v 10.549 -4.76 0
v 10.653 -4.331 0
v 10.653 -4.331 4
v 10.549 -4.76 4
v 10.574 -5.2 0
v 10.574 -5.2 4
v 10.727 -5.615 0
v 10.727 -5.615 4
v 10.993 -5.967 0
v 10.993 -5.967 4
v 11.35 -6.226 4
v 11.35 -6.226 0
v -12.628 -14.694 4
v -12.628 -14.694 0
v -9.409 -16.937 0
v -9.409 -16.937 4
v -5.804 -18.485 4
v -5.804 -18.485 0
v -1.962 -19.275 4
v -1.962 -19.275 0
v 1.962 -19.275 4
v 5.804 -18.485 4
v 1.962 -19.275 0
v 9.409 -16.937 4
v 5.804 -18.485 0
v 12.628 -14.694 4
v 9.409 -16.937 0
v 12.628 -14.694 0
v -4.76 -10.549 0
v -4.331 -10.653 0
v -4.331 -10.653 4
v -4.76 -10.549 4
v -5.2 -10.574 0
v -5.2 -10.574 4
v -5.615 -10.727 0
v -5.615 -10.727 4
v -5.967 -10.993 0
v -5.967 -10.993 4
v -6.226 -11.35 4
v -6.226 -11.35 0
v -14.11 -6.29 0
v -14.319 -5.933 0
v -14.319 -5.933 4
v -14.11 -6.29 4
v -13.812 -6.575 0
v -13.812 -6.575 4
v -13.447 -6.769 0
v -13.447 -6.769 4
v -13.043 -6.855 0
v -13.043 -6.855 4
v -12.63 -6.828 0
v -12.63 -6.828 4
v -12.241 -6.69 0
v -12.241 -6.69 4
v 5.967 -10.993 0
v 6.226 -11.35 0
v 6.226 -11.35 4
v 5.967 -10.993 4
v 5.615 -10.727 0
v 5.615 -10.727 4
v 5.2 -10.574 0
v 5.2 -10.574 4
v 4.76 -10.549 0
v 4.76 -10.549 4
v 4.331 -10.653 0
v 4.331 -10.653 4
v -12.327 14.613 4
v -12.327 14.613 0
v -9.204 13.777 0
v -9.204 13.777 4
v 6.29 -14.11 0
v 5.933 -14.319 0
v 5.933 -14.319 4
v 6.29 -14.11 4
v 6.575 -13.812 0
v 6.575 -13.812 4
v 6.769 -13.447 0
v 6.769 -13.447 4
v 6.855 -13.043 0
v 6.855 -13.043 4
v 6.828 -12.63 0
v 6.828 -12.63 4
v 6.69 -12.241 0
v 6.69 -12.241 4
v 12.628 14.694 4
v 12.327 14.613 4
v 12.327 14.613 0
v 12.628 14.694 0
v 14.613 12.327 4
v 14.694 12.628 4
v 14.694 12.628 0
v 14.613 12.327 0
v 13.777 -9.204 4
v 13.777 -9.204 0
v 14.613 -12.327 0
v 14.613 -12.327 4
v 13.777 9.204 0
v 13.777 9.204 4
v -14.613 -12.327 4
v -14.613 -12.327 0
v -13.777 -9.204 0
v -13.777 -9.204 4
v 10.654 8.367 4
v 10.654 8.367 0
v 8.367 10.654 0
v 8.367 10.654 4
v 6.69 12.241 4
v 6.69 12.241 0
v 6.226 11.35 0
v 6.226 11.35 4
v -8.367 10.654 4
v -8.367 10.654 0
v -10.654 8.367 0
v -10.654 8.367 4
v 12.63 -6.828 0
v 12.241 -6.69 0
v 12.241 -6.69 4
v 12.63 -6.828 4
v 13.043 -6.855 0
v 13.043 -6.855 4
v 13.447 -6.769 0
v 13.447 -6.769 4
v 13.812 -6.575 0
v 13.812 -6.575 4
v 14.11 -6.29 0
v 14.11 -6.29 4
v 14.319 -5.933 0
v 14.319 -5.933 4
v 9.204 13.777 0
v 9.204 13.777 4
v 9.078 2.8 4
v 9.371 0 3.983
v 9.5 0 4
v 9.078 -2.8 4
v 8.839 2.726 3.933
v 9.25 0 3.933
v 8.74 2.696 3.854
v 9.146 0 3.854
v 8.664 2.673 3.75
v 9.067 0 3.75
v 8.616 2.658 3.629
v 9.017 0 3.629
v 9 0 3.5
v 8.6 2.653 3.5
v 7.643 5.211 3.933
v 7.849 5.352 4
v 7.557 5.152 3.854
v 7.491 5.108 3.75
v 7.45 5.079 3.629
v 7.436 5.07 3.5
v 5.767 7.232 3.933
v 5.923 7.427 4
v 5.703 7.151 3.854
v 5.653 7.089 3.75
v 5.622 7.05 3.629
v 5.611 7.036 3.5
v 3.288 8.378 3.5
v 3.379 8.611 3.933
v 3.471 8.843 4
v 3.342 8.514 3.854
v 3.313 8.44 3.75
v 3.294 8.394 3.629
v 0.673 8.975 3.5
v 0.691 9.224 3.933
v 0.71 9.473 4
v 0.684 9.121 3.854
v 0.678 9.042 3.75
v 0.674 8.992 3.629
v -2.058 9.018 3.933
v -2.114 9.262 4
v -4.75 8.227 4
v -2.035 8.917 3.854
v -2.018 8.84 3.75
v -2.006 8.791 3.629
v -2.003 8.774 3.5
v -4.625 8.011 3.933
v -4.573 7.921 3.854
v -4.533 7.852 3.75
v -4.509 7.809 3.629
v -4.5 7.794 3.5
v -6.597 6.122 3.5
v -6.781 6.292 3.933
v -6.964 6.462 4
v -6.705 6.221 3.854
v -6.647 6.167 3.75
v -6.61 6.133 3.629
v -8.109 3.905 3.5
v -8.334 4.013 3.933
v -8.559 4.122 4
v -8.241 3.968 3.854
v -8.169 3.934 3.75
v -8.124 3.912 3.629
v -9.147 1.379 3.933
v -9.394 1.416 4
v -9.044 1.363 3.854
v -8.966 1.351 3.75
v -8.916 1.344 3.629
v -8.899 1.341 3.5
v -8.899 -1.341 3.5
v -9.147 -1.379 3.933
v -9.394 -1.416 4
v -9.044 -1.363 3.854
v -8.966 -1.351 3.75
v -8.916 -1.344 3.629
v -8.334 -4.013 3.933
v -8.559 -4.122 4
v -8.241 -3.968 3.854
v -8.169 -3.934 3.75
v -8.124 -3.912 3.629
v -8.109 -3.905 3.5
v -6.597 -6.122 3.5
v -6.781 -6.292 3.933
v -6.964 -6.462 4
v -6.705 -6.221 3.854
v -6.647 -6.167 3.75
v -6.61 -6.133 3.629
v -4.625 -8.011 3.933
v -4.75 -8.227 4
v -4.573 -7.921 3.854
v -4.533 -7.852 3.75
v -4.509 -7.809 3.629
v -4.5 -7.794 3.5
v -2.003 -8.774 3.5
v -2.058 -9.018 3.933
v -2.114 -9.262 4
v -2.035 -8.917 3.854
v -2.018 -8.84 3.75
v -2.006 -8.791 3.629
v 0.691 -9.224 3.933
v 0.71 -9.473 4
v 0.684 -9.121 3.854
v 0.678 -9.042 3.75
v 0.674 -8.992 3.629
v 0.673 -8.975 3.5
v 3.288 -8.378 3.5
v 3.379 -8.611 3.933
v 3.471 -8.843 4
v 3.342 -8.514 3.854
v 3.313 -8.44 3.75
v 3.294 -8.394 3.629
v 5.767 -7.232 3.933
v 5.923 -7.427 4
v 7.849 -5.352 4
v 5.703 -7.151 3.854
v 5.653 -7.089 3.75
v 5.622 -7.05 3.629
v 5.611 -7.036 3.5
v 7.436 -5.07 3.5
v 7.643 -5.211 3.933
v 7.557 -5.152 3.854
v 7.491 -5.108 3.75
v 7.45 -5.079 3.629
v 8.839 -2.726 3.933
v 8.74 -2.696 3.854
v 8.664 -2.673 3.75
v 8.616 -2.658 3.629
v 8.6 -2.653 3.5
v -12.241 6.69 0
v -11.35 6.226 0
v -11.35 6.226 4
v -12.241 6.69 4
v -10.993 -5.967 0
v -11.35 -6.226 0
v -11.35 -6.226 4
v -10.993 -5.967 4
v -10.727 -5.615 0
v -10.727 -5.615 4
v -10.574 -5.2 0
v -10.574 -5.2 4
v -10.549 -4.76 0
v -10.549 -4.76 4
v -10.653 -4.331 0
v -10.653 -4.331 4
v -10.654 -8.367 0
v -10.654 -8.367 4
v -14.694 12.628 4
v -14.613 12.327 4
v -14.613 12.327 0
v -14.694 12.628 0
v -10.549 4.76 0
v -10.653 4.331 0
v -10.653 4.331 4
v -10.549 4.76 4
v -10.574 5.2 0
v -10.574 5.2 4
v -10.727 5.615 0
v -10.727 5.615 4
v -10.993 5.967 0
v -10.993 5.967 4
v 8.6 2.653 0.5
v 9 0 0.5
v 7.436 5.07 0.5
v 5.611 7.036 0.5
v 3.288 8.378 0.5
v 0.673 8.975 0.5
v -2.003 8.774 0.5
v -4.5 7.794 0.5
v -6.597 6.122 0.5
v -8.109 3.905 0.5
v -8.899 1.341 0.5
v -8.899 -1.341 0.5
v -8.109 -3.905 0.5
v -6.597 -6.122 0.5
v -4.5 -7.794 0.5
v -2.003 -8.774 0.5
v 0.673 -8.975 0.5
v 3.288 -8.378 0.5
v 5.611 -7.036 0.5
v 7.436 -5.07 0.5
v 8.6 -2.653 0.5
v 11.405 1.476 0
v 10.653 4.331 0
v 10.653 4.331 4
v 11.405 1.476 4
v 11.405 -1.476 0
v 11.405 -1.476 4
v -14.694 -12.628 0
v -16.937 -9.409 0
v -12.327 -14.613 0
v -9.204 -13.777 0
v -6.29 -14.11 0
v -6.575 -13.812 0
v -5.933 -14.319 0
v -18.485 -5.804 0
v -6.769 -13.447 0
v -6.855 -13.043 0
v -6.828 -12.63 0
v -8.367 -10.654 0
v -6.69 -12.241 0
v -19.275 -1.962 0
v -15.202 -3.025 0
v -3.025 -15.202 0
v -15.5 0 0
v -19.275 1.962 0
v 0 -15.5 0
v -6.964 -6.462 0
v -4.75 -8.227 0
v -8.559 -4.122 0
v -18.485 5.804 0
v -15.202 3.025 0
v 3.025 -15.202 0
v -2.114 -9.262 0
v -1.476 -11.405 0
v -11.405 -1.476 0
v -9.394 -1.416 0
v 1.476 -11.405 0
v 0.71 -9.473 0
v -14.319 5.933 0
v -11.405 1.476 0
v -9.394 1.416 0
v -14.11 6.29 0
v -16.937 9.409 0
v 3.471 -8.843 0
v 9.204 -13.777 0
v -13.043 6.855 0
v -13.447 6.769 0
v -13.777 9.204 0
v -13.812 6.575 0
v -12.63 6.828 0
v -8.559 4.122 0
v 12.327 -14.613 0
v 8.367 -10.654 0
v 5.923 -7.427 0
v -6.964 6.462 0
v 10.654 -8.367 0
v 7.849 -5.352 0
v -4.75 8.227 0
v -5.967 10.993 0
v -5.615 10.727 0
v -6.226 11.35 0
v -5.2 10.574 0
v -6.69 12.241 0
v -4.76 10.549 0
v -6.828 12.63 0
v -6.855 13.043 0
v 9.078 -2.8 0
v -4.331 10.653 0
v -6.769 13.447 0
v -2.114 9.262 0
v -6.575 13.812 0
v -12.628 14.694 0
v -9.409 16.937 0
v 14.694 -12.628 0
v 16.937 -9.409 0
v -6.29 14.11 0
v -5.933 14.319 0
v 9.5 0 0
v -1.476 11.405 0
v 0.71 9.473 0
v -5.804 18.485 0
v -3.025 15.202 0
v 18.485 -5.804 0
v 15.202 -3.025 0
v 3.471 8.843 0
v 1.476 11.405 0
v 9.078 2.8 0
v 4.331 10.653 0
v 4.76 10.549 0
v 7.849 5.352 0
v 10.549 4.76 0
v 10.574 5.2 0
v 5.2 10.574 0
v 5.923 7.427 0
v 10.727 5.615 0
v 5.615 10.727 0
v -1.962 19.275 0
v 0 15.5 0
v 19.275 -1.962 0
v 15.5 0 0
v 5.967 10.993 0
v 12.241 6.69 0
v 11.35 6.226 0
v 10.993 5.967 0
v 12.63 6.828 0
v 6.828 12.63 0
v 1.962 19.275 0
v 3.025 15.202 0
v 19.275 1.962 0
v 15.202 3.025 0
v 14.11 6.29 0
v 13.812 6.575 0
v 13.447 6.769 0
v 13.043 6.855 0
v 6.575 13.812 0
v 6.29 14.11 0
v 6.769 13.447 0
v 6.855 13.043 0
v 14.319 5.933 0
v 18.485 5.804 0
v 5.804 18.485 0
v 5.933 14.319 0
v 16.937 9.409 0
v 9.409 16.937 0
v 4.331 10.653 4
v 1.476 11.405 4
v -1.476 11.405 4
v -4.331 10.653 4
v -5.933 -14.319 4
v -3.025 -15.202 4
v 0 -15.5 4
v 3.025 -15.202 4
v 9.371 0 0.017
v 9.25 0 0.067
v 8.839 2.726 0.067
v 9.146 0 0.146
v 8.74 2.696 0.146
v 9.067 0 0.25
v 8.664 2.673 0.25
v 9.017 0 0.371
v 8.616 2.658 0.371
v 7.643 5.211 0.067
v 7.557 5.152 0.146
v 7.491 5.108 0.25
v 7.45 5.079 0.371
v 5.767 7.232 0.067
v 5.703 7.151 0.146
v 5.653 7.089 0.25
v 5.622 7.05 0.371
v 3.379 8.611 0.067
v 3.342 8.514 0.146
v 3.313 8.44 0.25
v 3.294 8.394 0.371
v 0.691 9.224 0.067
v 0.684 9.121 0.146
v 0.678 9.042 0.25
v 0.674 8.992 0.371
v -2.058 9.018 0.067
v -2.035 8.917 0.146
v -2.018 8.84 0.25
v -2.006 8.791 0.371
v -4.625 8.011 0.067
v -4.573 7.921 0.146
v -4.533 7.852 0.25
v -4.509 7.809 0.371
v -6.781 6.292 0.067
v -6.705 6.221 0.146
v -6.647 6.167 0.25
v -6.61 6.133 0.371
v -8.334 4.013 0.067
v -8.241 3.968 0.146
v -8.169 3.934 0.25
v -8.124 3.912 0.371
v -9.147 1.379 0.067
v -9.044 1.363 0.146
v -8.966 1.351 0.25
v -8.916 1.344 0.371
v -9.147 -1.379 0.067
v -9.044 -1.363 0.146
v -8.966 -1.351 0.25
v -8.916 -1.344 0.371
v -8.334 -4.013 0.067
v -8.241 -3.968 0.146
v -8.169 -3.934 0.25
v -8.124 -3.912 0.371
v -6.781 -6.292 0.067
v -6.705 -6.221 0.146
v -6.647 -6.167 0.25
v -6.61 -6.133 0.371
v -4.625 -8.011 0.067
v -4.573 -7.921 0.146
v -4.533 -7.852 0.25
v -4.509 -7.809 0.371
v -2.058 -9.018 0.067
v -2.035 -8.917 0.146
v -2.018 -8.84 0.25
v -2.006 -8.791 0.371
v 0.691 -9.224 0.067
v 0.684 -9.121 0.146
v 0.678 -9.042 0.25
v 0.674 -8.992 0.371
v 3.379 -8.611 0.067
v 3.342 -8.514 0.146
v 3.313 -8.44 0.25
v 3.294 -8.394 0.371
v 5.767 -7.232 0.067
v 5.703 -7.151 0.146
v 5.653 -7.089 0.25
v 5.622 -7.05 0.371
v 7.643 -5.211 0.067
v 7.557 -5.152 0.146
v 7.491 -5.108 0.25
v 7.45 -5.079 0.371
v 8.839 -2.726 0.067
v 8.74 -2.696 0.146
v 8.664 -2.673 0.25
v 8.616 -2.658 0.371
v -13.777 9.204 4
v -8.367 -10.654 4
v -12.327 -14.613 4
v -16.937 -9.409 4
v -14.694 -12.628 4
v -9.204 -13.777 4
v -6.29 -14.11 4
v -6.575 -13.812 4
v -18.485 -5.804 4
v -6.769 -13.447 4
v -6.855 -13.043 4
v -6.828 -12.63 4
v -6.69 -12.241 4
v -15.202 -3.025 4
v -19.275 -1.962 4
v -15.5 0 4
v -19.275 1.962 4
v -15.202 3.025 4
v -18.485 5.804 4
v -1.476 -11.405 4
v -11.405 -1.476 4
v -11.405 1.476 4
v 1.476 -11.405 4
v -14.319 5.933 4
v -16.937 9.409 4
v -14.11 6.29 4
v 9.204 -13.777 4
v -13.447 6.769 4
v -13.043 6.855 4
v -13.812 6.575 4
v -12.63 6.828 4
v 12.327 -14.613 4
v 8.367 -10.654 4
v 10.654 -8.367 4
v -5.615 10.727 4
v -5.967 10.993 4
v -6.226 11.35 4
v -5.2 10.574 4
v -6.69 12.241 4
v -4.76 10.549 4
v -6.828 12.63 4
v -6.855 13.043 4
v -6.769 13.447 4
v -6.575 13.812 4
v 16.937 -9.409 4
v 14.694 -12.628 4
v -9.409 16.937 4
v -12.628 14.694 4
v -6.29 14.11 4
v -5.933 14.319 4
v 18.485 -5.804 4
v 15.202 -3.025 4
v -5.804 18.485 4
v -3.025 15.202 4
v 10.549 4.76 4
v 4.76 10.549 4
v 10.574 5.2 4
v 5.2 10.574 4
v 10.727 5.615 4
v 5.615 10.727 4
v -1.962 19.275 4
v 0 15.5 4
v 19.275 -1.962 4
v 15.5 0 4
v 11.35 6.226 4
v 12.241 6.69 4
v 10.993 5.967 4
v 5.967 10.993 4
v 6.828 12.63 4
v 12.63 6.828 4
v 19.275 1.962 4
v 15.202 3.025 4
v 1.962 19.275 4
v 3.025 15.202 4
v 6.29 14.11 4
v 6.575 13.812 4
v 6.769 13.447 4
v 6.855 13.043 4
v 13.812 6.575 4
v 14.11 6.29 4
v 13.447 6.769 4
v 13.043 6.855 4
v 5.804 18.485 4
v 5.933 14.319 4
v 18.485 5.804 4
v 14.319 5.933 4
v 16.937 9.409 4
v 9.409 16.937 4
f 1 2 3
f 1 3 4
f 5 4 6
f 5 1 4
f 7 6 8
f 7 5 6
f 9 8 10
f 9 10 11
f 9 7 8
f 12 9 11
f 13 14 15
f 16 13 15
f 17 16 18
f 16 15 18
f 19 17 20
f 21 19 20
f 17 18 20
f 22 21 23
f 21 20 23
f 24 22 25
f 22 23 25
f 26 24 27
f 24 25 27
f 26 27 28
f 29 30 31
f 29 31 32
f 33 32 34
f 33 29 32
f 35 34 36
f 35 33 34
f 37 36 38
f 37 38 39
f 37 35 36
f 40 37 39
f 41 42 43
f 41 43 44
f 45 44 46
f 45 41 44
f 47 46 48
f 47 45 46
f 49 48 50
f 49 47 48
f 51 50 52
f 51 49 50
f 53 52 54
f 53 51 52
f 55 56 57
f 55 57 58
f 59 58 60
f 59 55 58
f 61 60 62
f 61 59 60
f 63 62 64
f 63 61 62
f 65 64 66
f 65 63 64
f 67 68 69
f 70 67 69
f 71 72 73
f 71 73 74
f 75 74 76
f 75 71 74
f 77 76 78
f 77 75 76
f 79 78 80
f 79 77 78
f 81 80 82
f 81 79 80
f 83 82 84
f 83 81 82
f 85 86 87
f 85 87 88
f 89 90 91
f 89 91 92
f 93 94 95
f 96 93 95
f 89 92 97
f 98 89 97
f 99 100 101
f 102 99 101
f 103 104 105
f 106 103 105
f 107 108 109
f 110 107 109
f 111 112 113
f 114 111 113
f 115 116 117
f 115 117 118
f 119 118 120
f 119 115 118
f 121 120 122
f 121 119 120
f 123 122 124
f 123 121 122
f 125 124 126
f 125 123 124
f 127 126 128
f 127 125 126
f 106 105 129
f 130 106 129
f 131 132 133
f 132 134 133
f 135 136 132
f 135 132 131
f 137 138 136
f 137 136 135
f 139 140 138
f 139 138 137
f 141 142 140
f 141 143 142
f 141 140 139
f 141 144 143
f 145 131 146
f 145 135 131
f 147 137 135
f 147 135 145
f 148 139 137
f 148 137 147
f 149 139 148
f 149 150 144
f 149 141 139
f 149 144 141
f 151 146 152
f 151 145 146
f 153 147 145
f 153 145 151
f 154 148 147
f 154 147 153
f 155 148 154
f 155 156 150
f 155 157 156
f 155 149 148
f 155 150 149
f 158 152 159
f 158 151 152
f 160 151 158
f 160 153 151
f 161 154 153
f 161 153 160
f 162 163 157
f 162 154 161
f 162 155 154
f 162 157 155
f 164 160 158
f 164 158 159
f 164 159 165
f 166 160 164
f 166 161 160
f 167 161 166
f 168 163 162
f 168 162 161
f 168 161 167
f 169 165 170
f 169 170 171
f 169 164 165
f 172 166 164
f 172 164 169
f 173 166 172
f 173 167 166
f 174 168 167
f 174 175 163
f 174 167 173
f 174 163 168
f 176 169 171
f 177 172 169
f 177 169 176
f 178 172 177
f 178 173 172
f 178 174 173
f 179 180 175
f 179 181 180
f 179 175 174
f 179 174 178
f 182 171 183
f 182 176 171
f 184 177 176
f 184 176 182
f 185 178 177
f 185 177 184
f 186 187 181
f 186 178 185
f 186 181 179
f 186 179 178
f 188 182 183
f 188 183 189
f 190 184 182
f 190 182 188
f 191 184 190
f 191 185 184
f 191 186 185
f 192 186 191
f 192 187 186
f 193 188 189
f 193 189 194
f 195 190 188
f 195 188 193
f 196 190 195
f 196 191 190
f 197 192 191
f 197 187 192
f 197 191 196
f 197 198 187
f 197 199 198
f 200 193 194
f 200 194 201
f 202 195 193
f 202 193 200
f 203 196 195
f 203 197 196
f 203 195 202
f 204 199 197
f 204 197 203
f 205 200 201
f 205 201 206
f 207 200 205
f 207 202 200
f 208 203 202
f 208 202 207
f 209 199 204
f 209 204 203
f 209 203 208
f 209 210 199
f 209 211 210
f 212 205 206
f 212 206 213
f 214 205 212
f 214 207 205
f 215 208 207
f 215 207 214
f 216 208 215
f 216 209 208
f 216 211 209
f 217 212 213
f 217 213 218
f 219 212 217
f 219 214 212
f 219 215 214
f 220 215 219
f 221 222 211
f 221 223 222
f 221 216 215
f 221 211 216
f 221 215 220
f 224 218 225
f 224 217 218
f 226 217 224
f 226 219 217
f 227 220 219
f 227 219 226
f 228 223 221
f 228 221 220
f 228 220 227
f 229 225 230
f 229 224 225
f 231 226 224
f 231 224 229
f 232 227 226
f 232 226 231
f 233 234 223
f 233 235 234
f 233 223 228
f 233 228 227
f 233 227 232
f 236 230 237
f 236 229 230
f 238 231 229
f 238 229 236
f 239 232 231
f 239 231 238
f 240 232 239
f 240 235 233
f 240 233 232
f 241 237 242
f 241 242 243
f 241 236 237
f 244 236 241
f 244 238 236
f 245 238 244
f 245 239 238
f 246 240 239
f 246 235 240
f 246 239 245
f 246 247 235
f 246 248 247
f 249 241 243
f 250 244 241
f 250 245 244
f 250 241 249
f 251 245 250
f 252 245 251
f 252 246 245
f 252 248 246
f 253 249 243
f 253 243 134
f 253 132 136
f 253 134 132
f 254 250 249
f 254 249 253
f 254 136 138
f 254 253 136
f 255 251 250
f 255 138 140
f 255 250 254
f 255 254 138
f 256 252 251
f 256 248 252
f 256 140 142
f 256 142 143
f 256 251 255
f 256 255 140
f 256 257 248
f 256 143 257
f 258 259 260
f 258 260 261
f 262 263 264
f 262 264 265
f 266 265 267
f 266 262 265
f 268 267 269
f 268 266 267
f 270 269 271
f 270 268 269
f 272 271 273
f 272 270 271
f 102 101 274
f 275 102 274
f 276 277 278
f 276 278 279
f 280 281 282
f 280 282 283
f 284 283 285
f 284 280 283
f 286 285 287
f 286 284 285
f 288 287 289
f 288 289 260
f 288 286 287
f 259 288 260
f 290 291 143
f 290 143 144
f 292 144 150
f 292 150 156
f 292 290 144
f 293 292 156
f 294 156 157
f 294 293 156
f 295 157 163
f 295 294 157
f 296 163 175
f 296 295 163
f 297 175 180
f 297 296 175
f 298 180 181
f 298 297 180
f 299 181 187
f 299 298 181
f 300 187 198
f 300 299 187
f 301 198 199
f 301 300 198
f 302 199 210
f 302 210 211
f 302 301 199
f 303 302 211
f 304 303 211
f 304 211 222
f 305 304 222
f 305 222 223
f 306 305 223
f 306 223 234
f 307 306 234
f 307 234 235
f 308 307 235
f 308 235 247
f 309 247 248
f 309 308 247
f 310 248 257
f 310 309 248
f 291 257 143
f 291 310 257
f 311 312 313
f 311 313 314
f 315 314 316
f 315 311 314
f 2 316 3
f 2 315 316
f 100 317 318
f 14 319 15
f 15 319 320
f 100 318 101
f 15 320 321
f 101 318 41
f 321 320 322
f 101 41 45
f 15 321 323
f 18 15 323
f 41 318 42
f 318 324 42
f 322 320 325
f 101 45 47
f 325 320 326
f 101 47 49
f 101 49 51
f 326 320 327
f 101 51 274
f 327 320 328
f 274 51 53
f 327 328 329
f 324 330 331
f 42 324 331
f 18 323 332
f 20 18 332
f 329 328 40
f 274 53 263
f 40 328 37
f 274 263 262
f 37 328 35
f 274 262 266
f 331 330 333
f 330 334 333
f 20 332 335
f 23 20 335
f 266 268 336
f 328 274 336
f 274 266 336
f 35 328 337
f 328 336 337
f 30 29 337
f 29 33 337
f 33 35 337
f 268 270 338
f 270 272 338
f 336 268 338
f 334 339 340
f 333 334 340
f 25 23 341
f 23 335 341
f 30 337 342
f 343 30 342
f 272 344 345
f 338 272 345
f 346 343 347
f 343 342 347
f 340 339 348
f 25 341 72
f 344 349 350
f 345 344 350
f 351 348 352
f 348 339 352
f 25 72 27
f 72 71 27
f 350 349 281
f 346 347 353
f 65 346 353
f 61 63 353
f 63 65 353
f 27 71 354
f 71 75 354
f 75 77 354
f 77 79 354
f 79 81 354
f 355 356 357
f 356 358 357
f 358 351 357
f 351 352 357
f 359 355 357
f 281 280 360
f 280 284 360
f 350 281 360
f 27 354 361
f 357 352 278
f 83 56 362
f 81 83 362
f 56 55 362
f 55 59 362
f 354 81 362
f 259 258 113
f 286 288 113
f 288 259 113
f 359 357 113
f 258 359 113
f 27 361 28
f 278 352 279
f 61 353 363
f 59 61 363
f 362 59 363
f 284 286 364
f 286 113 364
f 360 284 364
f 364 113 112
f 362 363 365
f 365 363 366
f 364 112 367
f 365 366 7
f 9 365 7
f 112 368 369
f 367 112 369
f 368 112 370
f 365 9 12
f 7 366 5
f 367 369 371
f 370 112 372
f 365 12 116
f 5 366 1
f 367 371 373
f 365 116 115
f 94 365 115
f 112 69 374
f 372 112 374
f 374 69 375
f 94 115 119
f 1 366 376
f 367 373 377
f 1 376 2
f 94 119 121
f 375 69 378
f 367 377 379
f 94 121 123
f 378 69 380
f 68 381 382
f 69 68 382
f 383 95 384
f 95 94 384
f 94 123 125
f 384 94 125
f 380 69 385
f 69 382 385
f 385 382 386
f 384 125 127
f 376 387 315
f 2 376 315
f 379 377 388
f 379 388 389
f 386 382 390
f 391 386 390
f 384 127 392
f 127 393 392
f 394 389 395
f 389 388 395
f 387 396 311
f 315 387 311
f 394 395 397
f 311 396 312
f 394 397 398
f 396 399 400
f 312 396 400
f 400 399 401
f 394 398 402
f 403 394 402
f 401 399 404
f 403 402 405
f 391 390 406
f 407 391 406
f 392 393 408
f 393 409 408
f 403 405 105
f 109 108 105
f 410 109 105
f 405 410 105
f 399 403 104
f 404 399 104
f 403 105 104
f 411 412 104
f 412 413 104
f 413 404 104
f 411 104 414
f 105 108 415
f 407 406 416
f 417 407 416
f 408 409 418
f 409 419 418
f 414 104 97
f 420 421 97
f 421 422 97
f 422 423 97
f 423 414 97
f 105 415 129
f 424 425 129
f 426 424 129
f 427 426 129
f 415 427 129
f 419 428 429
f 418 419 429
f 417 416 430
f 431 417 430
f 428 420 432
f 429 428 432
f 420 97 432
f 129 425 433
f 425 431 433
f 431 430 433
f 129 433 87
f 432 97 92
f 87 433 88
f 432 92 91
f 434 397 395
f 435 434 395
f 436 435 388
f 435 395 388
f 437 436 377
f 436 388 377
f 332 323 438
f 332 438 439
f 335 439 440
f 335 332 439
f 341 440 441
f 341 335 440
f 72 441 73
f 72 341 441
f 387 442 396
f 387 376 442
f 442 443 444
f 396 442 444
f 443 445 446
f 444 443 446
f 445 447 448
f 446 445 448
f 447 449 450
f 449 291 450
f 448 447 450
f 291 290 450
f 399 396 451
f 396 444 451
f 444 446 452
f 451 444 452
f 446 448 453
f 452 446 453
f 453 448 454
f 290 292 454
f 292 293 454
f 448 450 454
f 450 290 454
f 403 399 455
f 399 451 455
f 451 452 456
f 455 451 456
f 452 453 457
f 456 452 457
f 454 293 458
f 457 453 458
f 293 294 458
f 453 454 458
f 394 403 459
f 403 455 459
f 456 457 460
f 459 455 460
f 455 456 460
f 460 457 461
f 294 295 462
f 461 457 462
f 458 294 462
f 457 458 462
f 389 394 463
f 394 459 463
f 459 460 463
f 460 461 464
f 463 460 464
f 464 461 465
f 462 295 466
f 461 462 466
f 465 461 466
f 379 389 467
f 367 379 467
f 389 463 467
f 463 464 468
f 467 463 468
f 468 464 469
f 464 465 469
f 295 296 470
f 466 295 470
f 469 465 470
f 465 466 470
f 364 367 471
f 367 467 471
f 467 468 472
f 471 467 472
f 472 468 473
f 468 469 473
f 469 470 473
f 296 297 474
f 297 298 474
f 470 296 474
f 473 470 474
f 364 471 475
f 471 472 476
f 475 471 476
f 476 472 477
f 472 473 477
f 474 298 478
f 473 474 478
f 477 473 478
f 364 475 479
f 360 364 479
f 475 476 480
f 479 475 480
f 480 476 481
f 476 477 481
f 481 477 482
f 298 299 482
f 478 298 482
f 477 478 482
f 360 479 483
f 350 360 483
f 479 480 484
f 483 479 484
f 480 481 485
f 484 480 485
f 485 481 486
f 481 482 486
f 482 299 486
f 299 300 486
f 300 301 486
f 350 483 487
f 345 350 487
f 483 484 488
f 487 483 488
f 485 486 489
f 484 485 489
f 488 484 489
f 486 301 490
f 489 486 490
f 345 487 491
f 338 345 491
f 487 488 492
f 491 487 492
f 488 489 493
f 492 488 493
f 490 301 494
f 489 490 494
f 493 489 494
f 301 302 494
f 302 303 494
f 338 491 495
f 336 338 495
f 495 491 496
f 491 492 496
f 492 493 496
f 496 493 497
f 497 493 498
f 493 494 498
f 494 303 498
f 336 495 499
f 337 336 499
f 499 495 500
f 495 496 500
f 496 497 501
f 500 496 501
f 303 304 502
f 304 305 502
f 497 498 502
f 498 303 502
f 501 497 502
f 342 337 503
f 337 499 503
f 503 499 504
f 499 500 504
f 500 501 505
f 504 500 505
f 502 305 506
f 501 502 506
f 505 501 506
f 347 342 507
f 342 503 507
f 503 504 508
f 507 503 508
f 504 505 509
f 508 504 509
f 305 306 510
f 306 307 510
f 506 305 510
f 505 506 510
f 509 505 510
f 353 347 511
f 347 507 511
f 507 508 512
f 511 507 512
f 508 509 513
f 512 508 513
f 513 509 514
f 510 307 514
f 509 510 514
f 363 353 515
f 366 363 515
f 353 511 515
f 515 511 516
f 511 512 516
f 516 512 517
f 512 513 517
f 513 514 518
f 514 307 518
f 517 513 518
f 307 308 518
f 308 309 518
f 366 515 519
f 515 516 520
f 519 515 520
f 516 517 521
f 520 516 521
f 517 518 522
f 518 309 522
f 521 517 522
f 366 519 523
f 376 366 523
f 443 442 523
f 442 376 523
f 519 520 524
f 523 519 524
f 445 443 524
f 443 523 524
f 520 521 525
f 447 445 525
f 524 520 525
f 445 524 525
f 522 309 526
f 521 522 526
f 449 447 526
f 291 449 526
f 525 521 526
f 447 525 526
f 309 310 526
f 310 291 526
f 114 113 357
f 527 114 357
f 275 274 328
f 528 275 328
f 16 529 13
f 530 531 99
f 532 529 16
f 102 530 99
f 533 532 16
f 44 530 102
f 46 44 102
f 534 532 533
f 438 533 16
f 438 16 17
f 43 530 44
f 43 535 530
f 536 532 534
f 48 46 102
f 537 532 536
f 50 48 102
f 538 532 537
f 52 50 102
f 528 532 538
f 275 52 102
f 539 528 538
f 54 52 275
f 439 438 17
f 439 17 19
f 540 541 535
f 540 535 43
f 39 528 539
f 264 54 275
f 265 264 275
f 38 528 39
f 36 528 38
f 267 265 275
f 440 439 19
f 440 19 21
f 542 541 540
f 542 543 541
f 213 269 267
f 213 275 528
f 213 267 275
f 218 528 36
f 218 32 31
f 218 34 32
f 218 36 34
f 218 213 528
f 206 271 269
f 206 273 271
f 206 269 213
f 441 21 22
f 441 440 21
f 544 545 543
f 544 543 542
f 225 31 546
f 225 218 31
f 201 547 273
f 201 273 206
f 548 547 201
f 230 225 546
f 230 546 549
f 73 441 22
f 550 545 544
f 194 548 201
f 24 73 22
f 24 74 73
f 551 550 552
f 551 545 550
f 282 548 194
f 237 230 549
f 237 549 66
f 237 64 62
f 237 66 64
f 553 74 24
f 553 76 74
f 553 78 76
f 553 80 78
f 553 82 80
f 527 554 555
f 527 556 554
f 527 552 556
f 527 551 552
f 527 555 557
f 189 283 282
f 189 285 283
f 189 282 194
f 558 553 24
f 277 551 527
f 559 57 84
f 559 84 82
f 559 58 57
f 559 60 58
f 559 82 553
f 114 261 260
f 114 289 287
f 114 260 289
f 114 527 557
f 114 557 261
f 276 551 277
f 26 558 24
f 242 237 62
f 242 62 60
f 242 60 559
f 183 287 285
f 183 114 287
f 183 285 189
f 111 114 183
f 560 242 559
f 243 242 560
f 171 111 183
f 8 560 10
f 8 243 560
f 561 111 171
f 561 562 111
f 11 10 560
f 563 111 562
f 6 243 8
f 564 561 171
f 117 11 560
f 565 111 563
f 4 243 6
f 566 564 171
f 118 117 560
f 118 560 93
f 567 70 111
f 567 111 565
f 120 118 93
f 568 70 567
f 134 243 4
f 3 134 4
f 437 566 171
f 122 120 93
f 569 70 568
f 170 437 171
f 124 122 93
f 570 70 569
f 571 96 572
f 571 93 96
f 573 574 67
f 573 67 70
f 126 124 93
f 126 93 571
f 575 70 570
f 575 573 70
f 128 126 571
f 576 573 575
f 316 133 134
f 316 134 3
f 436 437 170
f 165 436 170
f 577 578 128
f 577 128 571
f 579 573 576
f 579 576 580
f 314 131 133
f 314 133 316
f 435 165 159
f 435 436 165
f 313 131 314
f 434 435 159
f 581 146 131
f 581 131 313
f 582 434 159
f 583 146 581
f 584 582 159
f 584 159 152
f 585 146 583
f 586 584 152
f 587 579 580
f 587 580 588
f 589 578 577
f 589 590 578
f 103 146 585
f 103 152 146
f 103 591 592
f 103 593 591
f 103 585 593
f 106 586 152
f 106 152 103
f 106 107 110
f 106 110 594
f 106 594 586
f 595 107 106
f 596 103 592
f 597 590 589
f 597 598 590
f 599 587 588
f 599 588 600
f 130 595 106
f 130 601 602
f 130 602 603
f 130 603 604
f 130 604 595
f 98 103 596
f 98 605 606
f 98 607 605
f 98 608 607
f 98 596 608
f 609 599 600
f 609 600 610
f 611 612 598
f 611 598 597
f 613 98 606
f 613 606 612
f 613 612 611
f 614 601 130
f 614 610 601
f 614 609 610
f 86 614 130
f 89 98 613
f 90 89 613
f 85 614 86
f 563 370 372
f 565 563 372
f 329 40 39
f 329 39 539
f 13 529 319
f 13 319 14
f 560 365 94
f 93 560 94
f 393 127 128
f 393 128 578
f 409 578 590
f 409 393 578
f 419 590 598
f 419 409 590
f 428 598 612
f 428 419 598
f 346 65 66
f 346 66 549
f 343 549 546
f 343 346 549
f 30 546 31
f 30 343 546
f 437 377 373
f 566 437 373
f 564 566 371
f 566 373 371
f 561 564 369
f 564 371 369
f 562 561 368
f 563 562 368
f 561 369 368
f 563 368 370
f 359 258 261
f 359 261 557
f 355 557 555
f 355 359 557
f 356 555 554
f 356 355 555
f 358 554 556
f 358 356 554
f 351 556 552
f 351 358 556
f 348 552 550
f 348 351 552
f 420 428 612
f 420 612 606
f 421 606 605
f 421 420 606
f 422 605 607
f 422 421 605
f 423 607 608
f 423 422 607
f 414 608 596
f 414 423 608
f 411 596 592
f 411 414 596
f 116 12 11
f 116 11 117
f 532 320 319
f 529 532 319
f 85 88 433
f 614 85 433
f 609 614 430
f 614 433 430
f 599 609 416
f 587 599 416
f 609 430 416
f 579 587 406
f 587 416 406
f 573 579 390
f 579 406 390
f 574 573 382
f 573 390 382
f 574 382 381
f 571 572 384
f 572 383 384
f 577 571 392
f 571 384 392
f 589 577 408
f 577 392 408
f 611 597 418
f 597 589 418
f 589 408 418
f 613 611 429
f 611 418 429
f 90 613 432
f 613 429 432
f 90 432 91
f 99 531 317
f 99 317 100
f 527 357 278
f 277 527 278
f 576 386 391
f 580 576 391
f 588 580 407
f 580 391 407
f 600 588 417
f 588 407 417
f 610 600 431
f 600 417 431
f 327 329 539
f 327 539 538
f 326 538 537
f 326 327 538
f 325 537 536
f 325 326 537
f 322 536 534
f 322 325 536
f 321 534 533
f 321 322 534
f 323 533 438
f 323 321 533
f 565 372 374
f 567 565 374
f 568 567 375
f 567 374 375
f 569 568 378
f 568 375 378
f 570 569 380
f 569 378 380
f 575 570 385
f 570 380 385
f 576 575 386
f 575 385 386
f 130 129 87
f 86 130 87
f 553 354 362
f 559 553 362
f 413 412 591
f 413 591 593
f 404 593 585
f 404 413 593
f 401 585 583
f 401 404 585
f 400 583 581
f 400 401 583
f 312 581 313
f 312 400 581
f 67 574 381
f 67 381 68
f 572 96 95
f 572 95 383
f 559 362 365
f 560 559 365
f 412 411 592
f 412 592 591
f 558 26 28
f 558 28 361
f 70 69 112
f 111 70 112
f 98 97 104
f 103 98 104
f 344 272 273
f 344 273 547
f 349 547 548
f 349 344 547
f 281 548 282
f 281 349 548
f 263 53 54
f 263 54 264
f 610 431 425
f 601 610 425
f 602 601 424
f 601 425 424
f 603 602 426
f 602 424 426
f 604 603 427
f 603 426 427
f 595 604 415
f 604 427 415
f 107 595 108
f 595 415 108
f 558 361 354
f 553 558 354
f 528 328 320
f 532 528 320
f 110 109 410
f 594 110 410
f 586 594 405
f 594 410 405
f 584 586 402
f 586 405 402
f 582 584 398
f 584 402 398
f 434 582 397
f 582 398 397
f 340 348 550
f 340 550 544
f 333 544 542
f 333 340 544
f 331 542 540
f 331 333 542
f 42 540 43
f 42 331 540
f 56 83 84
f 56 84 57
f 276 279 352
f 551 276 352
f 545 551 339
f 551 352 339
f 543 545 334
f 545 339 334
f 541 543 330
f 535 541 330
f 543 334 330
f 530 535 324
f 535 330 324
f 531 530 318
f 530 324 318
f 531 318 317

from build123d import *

# Parameters (mm, degrees)
SKETCH1_R           = 19.375
SKETCH1_R_2         = 9
BOSS_EXTRUDE1_DEPTH = 4
CUT_EXTRUDE1_DEPTH  = 4
FILLET1_R           = 0.5
CUT_EXTRUDE2_DEPTH  = 10


with BuildPart() as part:
    # Sketch1 → Boss-Extrude1 (new body)
    with BuildSketch(Plane.XY):
        Circle(SKETCH1_R)
        Circle(SKETCH1_R_2, mode=Mode.SUBTRACT)
        with BuildLine():
            Line((6.689691504, 12.241024694), (6.226047976, 11.350373764))
            ThreePointArc((6.226047976, 11.350373764), (5.41320923, 10.635157913), (4.330662681, 10.653420143))
            ThreePointArc((4.330662681, 10.653420143), (0, 11.5), (-4.330662681, 10.653420143))
            ThreePointArc((-4.330662681, 10.653420143), (-5.41320923, 10.635157913), (-6.226047976, 11.350373764))
            Line((-6.226047976, 11.350373764), (-6.689691504, 12.241024694))
            ThreePointArc((-6.689691504, 12.241024694), (-6.768746058, 13.446590252), (-5.933372603, 14.319395572))
            ThreePointArc((-5.933372603, 14.319395572), (0, 15.5), (5.933372603, 14.319395572))
            ThreePointArc((5.933372603, 14.319395572), (6.768746058, 13.446590252), (6.689691504, 12.241024694))
        make_face(mode=Mode.SUBTRACT)
        with BuildLine():
            Line((12.241024694, 6.689691504), (11.350373764, 6.226047976))
            ThreePointArc((11.350373764, 6.226047976), (10.635157913, 5.41320923), (10.653420143, 4.330662681))
            ThreePointArc((10.653420143, 4.330662681), (11.5, 0), (10.653420143, -4.330662681))
            ThreePointArc((10.653420143, -4.330662681), (10.635157913, -5.41320923), (11.350373764, -6.226047976))
            Line((11.350373764, -6.226047976), (12.241024694, -6.689691504))
            ThreePointArc((12.241024694, -6.689691504), (13.446590252, -6.768746058), (14.319395572, -5.933372603))
            ThreePointArc((14.319395572, -5.933372603), (15.5, 0), (14.319395572, 5.933372603))
            ThreePointArc((14.319395572, 5.933372603), (13.446590252, 6.768746058), (12.241024694, 6.689691504))
        make_face(mode=Mode.SUBTRACT)
        with BuildLine():
            Line((6.689691504, -12.241024694), (6.226047976, -11.350373764))
            ThreePointArc((6.226047976, -11.350373764), (5.41320923, -10.635157913), (4.330662681, -10.653420143))
            ThreePointArc((4.330662681, -10.653420143), (0, -11.5), (-4.330662681, -10.653420143))
            ThreePointArc((-4.330662681, -10.653420143), (-5.41320923, -10.635157913), (-6.226047976, -11.350373764))
            Line((-6.226047976, -11.350373764), (-6.689691504, -12.241024694))
            ThreePointArc((-6.689691504, -12.241024694), (-6.768746058, -13.446590252), (-5.933372603, -14.319395572))
            ThreePointArc((-5.933372603, -14.319395572), (0, -15.5), (5.933372603, -14.319395572))
            ThreePointArc((5.933372603, -14.319395572), (6.768746058, -13.446590252), (6.689691504, -12.241024694))
        make_face(mode=Mode.SUBTRACT)
        with BuildLine():
            Line((-12.241024694, -6.689691504), (-11.350373764, -6.226047976))
            ThreePointArc((-11.350373764, -6.226047976), (-10.635157913, -5.41320923), (-10.653420143, -4.330662681))
            ThreePointArc((-10.653420143, -4.330662681), (-11.5, 0), (-10.653420143, 4.330662681))
            ThreePointArc((-10.653420143, 4.330662681), (-10.635157913, 5.41320923), (-11.350373764, 6.226047976))
            Line((-11.350373764, 6.226047976), (-12.241024694, 6.689691504))
            ThreePointArc((-12.241024694, 6.689691504), (-13.446590252, 6.768746058), (-14.319395572, 5.933372603))
            ThreePointArc((-14.319395572, 5.933372603), (-15.5, 0), (-14.319395572, -5.933372603))
            ThreePointArc((-14.319395572, -5.933372603), (-13.446590252, -6.768746058), (-12.241024694, -6.689691504))
        make_face(mode=Mode.SUBTRACT)
    extrude(amount=BOSS_EXTRUDE1_DEPTH)

    # Sketch2 → Cut-Extrude1 (cut)
    with BuildSketch(Plane(origin=(0, 0, 0), x_dir=(-1, 0, 0), z_dir=(0, 0, -1))):
        Polygon((10.65368142, -8.367490994), (8.367490994, -10.65368142), (9.204294768, -13.776675621), (12.327288968, -14.613479395), (14.613479395, -12.327288968), (13.776675621, -9.204294768), align=None)
        Polygon((13.776675621, 9.204294768), (14.613479395, 12.327288968), (12.327288968, 14.613479395), (9.204294768, 13.776675621), (8.367490994, 10.65368142), (10.65368142, 8.367490994), align=None)
        Polygon((-8.367490994, -10.65368142), (-10.65368142, -8.367490994), (-13.776675621, -9.204294768), (-14.613479395, -12.327288968), (-12.327288968, -14.613479395), (-9.204294768, -13.776675621), align=None)
        Polygon((-10.65368142, 8.367490994), (-8.367490994, 10.65368142), (-9.204294768, 13.776675621), (-12.327288968, 14.613479395), (-14.613479395, 12.327288968), (-13.776675621, 9.204294768), align=None)
    extrude(amount=-CUT_EXTRUDE1_DEPTH, mode=Mode.SUBTRACT)

    # Fillet1
    fillet1_edges = [part.edges().sort_by_distance(p)[0] for p in [
        (-9, 0, 0),
        (-9, 0, 4),
    ]]
    fillet(fillet1_edges, radius=FILLET1_R)

    # Sketch3 → Cut-Extrude2 (cut)
    with BuildSketch(Plane.XY.offset(4)):
        Polygon((-13.776675621, 9.204294768), (-15.450283169, 15.450283169), (-9.204294768, 13.776675621), align=None)
        Polygon((9.204294768, 13.776675621), (15.450283169, 15.450283169), (13.776675621, 9.204294768), align=None)
        Polygon((13.776675621, -9.204294768), (15.450283169, -15.450283169), (9.204294768, -13.776675621), align=None)
        Polygon((-9.204294768, -13.776675621), (-15.450283169, -15.450283169), (-13.776675621, -9.204294768), align=None)
    extrude(amount=-CUT_EXTRUDE2_DEPTH, mode=Mode.SUBTRACT)


solid = part.part
